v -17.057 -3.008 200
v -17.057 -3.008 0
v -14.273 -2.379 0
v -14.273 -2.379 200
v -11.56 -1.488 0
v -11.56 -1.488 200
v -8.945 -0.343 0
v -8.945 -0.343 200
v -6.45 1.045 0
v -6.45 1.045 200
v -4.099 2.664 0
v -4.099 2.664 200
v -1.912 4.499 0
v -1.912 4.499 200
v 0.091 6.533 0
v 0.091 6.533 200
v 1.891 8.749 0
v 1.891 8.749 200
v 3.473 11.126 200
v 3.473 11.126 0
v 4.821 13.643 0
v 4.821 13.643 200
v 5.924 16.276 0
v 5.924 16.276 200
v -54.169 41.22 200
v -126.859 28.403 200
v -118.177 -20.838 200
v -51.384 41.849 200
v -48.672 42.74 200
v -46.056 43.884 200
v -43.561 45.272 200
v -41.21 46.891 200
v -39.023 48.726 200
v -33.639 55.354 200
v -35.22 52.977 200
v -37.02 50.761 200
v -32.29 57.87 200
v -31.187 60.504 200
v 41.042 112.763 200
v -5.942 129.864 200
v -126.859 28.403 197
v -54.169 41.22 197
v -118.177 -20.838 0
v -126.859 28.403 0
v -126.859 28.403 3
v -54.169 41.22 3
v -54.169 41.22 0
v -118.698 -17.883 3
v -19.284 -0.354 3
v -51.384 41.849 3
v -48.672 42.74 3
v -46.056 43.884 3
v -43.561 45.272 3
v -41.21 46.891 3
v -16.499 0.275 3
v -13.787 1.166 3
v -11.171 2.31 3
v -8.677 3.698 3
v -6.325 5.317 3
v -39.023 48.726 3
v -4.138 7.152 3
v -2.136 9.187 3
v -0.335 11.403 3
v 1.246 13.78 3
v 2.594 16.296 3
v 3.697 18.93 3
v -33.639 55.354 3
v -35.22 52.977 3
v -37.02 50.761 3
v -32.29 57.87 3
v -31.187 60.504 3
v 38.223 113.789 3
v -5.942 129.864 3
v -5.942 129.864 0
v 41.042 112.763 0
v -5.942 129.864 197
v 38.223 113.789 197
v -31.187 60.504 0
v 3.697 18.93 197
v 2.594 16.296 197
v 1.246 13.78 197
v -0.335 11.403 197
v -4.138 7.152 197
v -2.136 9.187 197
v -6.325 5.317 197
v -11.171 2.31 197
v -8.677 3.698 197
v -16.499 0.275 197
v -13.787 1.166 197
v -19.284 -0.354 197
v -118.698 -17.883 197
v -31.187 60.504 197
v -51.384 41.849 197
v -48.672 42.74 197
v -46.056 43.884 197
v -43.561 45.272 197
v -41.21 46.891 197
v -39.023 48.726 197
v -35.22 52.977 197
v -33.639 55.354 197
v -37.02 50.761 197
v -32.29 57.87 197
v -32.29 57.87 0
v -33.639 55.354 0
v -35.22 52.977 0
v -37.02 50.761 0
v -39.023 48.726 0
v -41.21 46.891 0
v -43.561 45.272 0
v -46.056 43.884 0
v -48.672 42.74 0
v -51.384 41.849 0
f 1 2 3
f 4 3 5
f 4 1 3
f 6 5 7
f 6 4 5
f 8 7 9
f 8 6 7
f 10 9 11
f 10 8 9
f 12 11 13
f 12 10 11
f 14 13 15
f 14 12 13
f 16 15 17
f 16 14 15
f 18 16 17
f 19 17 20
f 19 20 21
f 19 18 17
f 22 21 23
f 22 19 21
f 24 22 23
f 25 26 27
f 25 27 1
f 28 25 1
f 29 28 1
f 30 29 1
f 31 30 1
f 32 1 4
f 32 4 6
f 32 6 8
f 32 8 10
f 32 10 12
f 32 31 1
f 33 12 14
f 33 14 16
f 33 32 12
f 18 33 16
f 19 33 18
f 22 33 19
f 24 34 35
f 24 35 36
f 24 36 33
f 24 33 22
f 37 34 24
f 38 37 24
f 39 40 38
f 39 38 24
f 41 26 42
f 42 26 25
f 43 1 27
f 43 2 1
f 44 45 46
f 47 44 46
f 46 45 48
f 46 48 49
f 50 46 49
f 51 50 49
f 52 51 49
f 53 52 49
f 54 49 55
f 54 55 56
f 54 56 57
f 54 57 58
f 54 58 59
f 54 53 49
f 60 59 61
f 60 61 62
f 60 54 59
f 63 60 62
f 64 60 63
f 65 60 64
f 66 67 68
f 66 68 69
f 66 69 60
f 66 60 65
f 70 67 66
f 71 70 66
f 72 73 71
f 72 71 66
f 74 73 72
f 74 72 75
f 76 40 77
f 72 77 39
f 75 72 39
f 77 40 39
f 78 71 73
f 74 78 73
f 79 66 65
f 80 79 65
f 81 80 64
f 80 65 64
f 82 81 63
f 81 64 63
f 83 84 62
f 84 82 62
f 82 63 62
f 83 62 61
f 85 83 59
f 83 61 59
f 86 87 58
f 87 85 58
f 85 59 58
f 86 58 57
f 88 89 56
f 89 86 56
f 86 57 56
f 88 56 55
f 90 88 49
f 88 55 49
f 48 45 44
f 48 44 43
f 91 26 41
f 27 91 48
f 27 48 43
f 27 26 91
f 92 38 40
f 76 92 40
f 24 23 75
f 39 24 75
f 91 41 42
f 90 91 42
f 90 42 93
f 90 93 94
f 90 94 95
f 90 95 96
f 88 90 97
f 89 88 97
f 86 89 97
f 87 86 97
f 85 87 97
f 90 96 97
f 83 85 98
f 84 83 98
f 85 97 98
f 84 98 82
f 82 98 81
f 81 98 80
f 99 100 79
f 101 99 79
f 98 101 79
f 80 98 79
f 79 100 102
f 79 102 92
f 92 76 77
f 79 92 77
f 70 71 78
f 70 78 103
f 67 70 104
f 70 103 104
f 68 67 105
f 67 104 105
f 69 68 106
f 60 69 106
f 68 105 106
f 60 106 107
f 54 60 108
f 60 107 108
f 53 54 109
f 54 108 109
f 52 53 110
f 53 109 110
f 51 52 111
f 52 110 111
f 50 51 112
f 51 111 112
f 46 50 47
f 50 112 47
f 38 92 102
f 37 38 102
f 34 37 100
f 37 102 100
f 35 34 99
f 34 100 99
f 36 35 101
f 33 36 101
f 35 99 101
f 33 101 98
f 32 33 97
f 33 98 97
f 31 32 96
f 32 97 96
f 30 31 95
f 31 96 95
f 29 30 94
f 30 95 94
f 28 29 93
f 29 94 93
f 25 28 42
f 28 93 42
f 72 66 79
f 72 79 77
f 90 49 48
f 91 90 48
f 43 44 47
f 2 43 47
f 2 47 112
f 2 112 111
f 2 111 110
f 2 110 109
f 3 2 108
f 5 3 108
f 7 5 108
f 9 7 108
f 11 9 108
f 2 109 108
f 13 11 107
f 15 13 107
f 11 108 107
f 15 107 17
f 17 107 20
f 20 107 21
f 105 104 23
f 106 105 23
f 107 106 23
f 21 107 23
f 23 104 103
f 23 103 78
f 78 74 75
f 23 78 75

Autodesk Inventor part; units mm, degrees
ref_plane "YZ Plane" through (0, 0, 0) normal (1, 0, 0) x (0, 1, 0)
ref_plane "XZ Plane" through (0, 0, 0) normal (0, 1, 0) x (-1, 0, 0)
ref_plane "XY Plane" through (0, 0, 0) normal (0, 0, 1) x (1, 0, 0)
sketch "草圖1" plane through (0, 0, 0) normal (0, 0, 1) x (1, 0, 0)
  line L0 (0, 0) -> (-118.1769, -20.8378)
  line L1 (0, 0) -> (41.0424, 112.7631)
  line L2 (-150.6339, 0) -> (72.9885, 0) projected
  line L3 (-1.9284, 2.2981) -> (38.2199, 113.7796)
  line L4 (-1.9284, 2.2981) -> (-118.6879, -17.8816)
  line L5 (0, 0) -> (-1.9284, 2.2981) construction
  line L6 (-118.6879, -17.8816) -> (-118.1769, -20.8378)
  line L7 (38.2199, 113.7796) -> (41.0424, 112.7631)
  dimension "d0" = 10
  dimension "d1" = 70
  dimension "d2" = 120
  dimension "d3" = 60
  dimension "d5" = 3
extrude "擠出1" add sketch "草圖1" along normal blind 200
sketch "草圖2" plane through (0, 0, 200) normal (0, 0, 1) x (1, 0, 0)
  line L0 (-118.1769, -20.8378) -> (0, 0) projected
  line L1 (0, 0) -> (41.0424, 112.7631) projected
  line L2 (41.0424, 112.7631) -> (38.2199, 113.7796) projected
  line L3 (38.2199, 113.7796) -> (-1.9284, 2.2981) projected
  line L4 (-1.9284, 2.2981) -> (-118.6879, -17.8816) projected
  line L5 (-118.6879, -17.8816) -> (-118.1769, -20.8378) projected
  line L6 (-118.1769, -20.8378) -> (0, 0)
  line L7 (0, 0) -> (41.0424, 112.7631)
  line L8 (-126.8593, 28.4026) -> (-37.1114, 44.2276)
  line L9 (-37.1114, 44.2276) -> (-5.9422, 129.8641)
  line L10 (-37.1114, 44.2276) -> (0, 0) construction
  line L11 (-126.8593, 28.4026) -> (-118.1769, -20.8378)
  line L12 (-5.9422, 129.8641) -> (41.0424, 112.7631)
  dimension "d9" = 60
  dimension "d10" = 50
extrude "擠出2" add sketch "草圖2" against normal blind 200 contours L11 L8 L9 L12 L2 L3 L4 L5
shell "薄殼1" thickness 3 removed faces 4 at (-16.3319, 101.3186, 133.3333) at (25.3809, 118.4635, 133.3333) at (-67.0274, 38.9526, 133.3333) at (-123.9652, 11.9891, 133.3333)
fillet "圓角2" radius 30 4 edges at (-2.2267, 2.6537, 100) (0, 0, 100) (-37.1114, 44.2276, 198.5) (-37.1114, 44.2276, 1.5)
sketch "草圖3" plane through (0, 0, 200) normal (0, 0, 1) x (1, 0, 0)
  arc A0 (-17.0574, -3.0077) -> (5.924, 16.276) centre (-22.2668, 26.5366) ccw projected
  line L0 (5.924, 16.276) -> (41.0424, 112.7631) projected
  line L1 (41.0424, 112.7631) -> (-5.9422, 129.8641) projected
  line L2 (-5.9422, 129.8641) -> (-31.1874, 60.5036) projected
  arc A1 (-54.1687, 41.2199) -> (-31.1874, 60.5036) centre (-59.3782, 70.7642) ccw projected
  line L3 (-54.1687, 41.2199) -> (-126.8593, 28.4026) projected
  line L4 (-126.8593, 28.4026) -> (-118.1769, -20.8378) projected
  line L5 (-118.1769, -20.8378) -> (-17.0574, -3.0077) projected
  point P0 (0, 0)
properties part number "splitter"
